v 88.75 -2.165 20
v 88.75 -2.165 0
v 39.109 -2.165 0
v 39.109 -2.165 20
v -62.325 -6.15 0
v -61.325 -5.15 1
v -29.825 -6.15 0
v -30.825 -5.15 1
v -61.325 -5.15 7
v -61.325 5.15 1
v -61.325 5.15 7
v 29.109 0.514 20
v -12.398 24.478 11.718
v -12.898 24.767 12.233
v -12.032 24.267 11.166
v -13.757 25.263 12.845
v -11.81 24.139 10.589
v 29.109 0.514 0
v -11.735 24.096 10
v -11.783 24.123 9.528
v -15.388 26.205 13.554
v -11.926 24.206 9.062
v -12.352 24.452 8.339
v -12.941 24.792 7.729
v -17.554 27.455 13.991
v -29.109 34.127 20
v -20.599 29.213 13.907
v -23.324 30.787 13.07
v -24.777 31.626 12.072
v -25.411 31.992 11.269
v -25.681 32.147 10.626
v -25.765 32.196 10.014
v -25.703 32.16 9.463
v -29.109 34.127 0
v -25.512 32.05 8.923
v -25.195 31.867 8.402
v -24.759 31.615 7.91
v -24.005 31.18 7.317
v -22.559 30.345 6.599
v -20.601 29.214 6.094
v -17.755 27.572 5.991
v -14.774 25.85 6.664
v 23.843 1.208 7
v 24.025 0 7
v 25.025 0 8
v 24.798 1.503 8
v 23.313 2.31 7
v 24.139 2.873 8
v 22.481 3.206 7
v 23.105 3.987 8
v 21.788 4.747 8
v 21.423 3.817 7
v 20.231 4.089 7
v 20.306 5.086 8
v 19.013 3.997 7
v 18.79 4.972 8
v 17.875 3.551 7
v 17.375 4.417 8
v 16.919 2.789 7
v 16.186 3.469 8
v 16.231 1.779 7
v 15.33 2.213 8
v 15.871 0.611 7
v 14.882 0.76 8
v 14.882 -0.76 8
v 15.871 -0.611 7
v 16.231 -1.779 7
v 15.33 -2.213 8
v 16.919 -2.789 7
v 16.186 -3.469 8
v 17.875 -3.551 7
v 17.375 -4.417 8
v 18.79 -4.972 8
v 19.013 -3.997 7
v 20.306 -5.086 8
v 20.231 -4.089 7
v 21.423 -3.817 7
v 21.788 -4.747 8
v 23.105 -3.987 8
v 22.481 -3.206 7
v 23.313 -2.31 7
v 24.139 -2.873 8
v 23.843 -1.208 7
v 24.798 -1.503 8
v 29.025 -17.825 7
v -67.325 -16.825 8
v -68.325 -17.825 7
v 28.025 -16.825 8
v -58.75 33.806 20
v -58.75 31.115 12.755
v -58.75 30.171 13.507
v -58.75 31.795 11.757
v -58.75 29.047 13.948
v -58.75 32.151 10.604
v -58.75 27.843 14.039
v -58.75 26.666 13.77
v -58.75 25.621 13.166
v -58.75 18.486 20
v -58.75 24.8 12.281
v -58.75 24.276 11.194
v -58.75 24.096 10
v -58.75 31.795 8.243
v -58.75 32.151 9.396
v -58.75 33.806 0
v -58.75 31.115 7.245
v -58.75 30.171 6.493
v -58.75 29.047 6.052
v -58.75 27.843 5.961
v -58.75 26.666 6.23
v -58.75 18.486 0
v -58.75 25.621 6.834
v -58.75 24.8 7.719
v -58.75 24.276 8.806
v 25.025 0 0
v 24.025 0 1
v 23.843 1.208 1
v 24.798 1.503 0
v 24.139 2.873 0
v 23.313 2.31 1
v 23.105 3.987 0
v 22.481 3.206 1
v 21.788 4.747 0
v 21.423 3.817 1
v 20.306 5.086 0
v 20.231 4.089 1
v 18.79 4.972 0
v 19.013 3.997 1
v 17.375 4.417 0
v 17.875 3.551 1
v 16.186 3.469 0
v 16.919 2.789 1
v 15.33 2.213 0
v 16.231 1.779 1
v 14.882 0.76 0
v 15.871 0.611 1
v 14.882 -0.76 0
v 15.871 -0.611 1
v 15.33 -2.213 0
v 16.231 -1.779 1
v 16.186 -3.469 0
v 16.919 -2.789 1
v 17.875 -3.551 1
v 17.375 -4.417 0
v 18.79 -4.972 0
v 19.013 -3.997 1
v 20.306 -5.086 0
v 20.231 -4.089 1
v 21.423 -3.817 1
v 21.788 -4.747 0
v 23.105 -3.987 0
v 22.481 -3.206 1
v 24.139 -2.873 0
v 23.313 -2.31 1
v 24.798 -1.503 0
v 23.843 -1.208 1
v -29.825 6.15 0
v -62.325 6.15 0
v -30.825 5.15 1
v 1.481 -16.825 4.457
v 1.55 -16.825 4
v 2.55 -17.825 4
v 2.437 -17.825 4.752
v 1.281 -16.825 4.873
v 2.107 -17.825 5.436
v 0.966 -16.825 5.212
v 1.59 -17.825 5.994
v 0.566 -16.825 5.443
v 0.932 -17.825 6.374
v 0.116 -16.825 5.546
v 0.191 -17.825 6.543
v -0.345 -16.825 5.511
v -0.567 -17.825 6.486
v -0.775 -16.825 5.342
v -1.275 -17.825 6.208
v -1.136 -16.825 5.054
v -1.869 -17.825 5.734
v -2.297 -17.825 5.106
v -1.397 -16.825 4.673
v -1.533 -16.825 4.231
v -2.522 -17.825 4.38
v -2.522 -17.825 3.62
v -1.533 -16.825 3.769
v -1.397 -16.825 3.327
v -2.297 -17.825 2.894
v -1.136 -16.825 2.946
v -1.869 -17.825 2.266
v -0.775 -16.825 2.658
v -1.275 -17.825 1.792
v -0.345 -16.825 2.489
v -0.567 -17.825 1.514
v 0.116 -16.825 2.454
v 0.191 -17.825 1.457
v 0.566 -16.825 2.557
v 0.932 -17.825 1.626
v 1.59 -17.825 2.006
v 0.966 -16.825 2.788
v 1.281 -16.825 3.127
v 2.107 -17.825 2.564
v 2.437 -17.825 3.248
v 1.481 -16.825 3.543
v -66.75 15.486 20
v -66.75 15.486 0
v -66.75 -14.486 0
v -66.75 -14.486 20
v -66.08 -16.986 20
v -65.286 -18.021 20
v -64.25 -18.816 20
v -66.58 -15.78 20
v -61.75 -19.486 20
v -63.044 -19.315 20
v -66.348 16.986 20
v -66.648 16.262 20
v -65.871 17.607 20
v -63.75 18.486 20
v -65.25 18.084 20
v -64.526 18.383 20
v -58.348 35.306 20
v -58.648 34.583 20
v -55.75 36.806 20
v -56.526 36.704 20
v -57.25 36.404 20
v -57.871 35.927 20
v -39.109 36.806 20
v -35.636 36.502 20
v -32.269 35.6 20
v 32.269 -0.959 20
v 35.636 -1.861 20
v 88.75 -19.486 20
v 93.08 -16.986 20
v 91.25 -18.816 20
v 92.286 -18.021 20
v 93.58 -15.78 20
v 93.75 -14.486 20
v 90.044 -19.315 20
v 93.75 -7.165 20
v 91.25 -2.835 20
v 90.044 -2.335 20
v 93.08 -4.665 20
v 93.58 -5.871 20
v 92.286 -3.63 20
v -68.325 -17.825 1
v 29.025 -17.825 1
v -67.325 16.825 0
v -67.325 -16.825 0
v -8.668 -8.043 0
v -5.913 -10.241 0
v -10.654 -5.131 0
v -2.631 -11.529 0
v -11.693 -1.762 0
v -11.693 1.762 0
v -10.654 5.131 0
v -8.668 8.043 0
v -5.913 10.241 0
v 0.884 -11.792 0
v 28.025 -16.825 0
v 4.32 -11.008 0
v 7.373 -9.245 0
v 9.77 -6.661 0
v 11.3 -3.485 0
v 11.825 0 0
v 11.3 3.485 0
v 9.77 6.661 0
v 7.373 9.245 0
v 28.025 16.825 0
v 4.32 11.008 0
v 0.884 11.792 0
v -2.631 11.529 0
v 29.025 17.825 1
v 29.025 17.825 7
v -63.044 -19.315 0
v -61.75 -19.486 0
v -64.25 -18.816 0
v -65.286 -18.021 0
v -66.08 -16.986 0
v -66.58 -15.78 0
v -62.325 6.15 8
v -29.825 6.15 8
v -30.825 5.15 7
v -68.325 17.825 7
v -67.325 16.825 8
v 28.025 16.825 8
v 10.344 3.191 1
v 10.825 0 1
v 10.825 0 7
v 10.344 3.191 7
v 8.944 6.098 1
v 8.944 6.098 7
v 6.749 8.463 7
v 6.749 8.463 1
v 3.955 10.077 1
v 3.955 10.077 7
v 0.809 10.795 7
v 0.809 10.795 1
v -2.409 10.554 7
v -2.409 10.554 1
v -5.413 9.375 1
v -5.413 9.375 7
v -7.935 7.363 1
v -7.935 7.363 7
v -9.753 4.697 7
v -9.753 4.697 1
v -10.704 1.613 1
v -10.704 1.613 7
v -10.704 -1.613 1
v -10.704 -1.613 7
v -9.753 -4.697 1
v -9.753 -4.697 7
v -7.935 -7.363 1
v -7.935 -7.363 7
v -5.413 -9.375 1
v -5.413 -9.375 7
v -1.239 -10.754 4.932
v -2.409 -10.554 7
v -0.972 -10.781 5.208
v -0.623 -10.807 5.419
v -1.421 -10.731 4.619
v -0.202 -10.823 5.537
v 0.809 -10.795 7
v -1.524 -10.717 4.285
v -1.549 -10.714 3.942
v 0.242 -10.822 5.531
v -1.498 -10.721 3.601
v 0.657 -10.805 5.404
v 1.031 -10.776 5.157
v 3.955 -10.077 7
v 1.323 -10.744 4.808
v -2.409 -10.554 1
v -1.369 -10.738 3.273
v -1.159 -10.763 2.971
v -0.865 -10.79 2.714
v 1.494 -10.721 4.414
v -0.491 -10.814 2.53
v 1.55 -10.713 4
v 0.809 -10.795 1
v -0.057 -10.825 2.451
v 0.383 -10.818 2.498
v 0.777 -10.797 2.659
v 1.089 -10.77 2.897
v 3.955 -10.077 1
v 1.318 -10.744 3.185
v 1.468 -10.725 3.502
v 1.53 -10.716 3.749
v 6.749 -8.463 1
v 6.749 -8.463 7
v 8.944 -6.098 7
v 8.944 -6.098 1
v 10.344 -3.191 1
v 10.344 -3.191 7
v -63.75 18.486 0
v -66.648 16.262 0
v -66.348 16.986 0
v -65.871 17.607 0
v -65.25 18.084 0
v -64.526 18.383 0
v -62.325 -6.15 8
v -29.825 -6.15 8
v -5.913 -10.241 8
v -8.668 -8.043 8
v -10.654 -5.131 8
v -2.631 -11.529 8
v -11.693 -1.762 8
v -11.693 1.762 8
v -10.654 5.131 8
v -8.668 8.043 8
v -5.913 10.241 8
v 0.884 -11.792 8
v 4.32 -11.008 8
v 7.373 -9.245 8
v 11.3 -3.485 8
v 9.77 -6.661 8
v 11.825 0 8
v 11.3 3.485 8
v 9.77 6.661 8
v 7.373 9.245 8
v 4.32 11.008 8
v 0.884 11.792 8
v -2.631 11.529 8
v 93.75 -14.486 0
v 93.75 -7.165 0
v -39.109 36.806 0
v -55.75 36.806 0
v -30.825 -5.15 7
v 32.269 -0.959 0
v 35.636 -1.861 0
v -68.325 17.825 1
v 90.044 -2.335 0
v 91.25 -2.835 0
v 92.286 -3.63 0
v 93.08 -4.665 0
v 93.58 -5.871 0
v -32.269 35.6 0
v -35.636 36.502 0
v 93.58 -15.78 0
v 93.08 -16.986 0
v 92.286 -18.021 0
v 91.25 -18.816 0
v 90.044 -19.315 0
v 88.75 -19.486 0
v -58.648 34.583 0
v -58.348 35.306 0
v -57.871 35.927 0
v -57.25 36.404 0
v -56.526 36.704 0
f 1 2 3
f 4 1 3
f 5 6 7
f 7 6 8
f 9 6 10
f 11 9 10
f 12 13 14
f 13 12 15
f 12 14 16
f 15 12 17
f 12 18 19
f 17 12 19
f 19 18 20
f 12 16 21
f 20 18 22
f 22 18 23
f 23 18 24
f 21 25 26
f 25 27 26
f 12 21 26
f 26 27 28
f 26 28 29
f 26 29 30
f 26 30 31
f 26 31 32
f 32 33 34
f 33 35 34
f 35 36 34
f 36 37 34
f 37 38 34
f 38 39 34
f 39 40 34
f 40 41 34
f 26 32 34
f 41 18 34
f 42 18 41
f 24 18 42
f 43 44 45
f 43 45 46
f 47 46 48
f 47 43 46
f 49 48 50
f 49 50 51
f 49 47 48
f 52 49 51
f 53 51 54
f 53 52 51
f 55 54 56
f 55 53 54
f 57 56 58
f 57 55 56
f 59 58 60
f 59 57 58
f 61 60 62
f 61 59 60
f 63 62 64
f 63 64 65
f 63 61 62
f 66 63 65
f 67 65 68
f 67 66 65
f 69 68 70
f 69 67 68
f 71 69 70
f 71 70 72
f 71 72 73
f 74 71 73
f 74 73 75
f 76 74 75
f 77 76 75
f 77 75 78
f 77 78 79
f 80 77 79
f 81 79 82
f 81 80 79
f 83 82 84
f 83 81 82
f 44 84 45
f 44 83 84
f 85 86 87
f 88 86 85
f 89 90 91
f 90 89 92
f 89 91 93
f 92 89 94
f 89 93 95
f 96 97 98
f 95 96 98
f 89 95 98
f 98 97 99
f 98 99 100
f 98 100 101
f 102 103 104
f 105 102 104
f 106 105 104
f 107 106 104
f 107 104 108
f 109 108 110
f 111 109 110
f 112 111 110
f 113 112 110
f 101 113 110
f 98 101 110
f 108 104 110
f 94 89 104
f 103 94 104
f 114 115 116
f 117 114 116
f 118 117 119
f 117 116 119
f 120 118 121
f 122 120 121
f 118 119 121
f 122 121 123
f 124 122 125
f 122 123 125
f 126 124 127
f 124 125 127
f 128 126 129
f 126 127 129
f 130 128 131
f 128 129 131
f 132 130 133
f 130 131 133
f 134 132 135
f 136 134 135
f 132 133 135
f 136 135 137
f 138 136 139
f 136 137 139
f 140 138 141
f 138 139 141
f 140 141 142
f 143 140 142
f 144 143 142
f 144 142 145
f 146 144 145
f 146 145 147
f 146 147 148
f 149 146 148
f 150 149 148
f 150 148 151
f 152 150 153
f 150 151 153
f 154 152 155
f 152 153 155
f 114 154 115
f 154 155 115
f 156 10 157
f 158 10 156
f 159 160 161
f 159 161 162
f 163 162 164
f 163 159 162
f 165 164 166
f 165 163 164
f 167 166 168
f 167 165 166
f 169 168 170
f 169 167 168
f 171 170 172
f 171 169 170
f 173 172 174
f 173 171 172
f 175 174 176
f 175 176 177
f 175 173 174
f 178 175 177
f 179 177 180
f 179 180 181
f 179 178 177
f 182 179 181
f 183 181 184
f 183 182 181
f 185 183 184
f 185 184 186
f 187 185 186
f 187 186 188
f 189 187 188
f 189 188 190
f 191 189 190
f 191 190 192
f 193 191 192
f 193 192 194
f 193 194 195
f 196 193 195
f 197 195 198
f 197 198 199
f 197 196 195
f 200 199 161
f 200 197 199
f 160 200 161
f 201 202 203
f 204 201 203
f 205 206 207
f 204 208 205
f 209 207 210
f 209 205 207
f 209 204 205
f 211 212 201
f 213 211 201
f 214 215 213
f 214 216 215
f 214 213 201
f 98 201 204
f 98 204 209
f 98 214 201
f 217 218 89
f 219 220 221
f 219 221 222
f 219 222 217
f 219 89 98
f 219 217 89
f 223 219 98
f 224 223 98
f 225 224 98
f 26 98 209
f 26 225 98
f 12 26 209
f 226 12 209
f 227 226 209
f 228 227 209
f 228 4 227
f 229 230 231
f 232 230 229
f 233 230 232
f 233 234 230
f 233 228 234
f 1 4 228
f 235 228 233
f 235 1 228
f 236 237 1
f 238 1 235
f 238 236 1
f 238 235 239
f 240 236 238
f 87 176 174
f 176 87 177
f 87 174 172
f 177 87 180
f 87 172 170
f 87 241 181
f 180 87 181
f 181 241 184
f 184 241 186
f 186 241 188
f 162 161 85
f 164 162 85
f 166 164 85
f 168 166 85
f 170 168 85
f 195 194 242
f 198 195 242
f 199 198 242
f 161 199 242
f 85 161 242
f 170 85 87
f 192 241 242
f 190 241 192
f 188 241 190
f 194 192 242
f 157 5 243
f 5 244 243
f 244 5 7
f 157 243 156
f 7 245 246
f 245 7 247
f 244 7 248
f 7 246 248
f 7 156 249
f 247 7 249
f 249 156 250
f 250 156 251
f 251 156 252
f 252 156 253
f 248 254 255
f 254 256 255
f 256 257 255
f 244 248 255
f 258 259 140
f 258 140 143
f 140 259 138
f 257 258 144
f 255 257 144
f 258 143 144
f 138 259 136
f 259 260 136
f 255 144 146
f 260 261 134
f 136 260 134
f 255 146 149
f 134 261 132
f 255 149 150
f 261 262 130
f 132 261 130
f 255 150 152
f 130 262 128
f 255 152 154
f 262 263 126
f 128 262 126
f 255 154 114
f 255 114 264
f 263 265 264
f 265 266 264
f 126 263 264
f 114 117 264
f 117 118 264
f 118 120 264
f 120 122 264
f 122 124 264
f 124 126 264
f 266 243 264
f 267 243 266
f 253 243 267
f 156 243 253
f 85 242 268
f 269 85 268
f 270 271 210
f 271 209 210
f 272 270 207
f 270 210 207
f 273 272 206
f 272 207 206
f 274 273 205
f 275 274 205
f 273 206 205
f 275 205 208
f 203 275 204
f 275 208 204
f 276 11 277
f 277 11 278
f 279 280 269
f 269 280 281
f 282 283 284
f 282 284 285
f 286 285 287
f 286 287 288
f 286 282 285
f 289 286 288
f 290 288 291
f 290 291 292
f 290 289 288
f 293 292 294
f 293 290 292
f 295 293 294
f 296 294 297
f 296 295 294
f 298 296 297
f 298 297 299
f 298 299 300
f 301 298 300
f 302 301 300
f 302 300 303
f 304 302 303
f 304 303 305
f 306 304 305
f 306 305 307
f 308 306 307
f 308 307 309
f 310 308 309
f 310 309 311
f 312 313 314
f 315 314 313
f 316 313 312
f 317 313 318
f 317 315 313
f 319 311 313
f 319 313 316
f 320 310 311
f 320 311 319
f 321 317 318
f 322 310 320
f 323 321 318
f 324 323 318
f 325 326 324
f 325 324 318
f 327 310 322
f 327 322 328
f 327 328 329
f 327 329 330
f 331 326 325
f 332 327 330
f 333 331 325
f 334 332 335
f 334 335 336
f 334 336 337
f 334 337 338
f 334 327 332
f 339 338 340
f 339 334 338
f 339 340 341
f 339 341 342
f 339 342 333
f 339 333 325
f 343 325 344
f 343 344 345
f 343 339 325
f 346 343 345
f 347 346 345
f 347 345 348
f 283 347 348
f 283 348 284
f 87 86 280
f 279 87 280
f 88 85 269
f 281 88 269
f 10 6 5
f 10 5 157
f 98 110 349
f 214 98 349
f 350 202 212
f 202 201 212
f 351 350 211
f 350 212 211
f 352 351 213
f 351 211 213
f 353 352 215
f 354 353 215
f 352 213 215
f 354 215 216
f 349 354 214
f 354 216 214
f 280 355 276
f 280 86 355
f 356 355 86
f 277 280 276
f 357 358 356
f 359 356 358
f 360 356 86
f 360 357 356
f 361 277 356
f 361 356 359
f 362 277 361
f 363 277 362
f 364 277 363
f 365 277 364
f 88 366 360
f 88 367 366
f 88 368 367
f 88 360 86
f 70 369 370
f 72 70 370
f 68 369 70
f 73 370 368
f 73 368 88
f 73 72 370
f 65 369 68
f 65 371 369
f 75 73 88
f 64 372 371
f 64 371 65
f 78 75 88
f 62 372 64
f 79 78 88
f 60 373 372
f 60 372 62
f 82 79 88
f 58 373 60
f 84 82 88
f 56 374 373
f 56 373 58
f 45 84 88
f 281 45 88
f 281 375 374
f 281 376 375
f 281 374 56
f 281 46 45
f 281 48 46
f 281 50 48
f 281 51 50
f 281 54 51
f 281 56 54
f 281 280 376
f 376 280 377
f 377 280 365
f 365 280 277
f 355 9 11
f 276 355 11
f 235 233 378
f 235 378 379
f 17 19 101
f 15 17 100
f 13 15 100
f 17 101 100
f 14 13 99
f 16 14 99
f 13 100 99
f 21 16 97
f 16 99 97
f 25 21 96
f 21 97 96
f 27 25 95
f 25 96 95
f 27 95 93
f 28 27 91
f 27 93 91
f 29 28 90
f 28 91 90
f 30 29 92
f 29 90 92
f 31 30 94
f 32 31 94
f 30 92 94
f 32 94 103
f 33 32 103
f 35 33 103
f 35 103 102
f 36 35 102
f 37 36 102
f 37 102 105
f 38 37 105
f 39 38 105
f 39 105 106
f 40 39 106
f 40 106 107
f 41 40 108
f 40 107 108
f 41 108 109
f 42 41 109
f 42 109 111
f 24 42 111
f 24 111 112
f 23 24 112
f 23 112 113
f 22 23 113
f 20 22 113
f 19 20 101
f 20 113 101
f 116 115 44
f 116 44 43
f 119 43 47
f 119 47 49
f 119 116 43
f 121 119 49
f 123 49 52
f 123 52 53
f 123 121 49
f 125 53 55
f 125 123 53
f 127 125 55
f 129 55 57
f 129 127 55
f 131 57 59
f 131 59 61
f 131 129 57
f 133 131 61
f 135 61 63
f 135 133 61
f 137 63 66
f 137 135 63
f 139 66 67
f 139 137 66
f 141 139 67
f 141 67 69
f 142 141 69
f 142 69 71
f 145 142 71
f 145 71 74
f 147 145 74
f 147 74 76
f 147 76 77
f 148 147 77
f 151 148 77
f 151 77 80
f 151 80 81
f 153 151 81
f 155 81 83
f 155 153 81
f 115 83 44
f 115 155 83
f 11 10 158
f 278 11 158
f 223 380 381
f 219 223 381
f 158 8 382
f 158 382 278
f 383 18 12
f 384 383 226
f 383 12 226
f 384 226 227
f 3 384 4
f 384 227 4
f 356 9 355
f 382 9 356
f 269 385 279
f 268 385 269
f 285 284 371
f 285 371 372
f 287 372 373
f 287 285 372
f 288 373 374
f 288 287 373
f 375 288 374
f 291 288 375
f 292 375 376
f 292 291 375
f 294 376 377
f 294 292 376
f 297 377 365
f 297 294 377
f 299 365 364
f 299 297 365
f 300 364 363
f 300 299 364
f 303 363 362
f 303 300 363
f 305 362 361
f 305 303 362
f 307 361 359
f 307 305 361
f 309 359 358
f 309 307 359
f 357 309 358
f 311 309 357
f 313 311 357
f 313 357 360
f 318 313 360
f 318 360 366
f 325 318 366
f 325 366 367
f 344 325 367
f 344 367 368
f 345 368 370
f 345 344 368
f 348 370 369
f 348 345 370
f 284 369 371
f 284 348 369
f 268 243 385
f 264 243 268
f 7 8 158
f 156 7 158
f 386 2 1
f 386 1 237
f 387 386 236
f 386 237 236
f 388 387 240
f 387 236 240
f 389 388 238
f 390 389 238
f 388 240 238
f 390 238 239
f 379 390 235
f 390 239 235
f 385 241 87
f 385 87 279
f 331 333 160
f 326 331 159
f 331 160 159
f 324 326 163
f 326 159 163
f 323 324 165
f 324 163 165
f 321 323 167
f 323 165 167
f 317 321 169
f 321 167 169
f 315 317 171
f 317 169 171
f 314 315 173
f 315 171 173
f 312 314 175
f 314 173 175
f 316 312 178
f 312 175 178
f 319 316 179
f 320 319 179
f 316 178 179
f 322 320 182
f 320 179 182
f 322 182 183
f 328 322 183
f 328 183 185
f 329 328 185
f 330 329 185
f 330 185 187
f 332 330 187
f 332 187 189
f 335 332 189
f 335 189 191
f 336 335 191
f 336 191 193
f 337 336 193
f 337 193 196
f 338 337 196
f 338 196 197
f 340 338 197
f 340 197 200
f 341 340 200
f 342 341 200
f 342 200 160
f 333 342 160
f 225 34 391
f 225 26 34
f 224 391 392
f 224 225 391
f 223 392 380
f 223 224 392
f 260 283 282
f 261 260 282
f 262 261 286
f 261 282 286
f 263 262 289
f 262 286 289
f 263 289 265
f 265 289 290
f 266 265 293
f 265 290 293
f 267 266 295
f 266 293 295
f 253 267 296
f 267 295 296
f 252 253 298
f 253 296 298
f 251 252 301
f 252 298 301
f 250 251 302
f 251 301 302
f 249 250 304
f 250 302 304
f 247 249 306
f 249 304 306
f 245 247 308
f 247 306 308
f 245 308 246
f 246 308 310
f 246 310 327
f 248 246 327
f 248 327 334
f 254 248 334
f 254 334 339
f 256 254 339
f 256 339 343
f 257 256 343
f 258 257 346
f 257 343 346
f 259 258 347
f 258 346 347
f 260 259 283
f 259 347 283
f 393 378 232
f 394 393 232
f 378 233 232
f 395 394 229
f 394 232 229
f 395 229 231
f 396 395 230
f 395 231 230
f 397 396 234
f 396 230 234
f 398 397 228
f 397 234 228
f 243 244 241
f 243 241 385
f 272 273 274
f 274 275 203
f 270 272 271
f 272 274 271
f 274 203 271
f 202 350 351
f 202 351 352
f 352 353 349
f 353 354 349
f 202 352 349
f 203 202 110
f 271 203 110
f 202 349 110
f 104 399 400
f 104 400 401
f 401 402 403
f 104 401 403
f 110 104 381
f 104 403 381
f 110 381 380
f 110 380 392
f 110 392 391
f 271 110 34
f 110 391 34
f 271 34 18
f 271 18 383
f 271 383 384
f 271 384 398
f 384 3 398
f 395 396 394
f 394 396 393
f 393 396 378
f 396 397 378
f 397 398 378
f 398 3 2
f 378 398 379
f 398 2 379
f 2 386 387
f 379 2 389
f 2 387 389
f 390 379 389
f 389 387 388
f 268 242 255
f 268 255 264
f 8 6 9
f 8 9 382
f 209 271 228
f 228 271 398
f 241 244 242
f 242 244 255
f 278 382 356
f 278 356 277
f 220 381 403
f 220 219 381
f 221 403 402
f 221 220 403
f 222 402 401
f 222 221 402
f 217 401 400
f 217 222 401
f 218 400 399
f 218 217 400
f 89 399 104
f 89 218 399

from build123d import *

# Parameters (mm, degrees)
F0_W      = 97.35
F0_H      = 35.65
F0_W_2    = 30.5
F0_H_2    = 10.3
F0_R      = 10.825
F0_R_2    = 4.1
F1_DEPTH  = 8
F2_R      = 1.55
F3_DEPTH  = 12
F4_SIZE   = 1
F6_DEPTH  = 20
F7_R      = 4.05
F8_DEPTH  = 152.501
F10_DEPTH = 20
F11_R     = 20
F12_R     = 5
F13_R     = 3


with BuildPart() as f1:
    # F0 (on Top) → F1 (new body)
    with BuildSketch(Plane.XY):
        with Locations((-19.65, 0)):
            Rectangle(F0_W, F0_H)
        with Locations((-46.075, 0)):
            Rectangle(F0_W_2, F0_H_2, mode=Mode.SUBTRACT)
        Circle(F0_R, mode=Mode.SUBTRACT)
        with Locations((19.925, 0)):
            Circle(F0_R_2, mode=Mode.SUBTRACT)
    extrude(amount=F1_DEPTH)

    # F2 (on face) → F3 (cut)
    with BuildSketch(Plane.XZ.offset(17.825)):
        with Locations((0, 4)):
            Circle(F2_R)
    extrude(amount=-F3_DEPTH, mode=Mode.SUBTRACT)

    # F4
    f4_edges = [f1.edges().sort_by_distance(p)[0] for p in [
        (-19.65, 17.825, 8),
        (-68.325, 0, 8),
        (-19.65, -17.825, 8),
        (29.025, 0, 8),
        (-61.325, 0, 8),
        (-46.075, 5.15, 8),
        (-30.825, 0, 8),
        (-46.075, -5.15, 8),
        (-10.825, 0, 8),
        (15.825, 0, 8),
        (-19.65, 17.825, 0),
        (-68.325, 0, 0),
        (-19.65, -17.825, 0),
        (29.025, 0, 0),
        (-61.325, 0, 0),
        (-46.075, 5.15, 0),
        (-30.825, 0, 0),
        (-46.075, -5.15, 0),
        (-10.825, 0, 0),
        (15.825, 0, 0),
        (-1.55, -17.825, 4),
    ]]
    chamfer(f4_edges, length=F4_SIZE)


with BuildPart() as f6:
    # F5 (on Top) → F6 (new body)
    with BuildSketch(Plane.XY):
        Polygon((-33.75, 36.8060796608), (-58.75, 36.8060796608), (-58.75, 19.4855715851), (-33.75, 19.4855715851), (33.75, -19.4855715851), (93.75, -19.4855715851), (93.75, -2.1650635095), (33.75, -2.1650635095), align=None)
    extrude(amount=F6_DEPTH)

    # F7 (on face) → F8 (cut, through all)
    with BuildSketch(Plane(origin=(-58.75, 0, 0), x_dir=(0, -1, 0), z_dir=(-1, 0, 0))):
        with Locations((-28.145825623, 10)):
            Circle(F7_R)
    extrude(amount=-F8_DEPTH, mode=Mode.SUBTRACT)

    # F9 (on Top) → F10 (join)
    with BuildSketch(Plane.XY):
        Polygon((-33.75, 19.4855715851), (-58.75, 19.4855715851), (-58.75, 18.4855715851), (-66.75, 18.4855715851), (-66.75, -19.4855715851), (33.75, -19.4855715851), align=None)
    extrude(amount=F10_DEPTH)

    # F11
    f11_edges = [f6.edges().sort_by_distance(p)[0] for p in [
        (-33.75, 36.80608, 10),
        (33.75, -2.165064, 10),
    ]]
    fillet(f11_edges, radius=F11_R)

    # F12
    f12_edges = [f6.edges().sort_by_distance(p)[0] for p in [
        (93.75, -2.165064, 10),
        (93.75, -19.485572, 10),
        (-66.75, -19.485572, 10),
    ]]
    fillet(f12_edges, radius=F12_R)

    # F13
    f13_edges = [f6.edges().sort_by_distance(p)[0] for p in [
        (-66.75, 18.485572, 10),
        (-58.75, 36.80608, 10),
    ]]
    fillet(f13_edges, radius=F13_R)


solid = Compound([f1.part, f6.part])
